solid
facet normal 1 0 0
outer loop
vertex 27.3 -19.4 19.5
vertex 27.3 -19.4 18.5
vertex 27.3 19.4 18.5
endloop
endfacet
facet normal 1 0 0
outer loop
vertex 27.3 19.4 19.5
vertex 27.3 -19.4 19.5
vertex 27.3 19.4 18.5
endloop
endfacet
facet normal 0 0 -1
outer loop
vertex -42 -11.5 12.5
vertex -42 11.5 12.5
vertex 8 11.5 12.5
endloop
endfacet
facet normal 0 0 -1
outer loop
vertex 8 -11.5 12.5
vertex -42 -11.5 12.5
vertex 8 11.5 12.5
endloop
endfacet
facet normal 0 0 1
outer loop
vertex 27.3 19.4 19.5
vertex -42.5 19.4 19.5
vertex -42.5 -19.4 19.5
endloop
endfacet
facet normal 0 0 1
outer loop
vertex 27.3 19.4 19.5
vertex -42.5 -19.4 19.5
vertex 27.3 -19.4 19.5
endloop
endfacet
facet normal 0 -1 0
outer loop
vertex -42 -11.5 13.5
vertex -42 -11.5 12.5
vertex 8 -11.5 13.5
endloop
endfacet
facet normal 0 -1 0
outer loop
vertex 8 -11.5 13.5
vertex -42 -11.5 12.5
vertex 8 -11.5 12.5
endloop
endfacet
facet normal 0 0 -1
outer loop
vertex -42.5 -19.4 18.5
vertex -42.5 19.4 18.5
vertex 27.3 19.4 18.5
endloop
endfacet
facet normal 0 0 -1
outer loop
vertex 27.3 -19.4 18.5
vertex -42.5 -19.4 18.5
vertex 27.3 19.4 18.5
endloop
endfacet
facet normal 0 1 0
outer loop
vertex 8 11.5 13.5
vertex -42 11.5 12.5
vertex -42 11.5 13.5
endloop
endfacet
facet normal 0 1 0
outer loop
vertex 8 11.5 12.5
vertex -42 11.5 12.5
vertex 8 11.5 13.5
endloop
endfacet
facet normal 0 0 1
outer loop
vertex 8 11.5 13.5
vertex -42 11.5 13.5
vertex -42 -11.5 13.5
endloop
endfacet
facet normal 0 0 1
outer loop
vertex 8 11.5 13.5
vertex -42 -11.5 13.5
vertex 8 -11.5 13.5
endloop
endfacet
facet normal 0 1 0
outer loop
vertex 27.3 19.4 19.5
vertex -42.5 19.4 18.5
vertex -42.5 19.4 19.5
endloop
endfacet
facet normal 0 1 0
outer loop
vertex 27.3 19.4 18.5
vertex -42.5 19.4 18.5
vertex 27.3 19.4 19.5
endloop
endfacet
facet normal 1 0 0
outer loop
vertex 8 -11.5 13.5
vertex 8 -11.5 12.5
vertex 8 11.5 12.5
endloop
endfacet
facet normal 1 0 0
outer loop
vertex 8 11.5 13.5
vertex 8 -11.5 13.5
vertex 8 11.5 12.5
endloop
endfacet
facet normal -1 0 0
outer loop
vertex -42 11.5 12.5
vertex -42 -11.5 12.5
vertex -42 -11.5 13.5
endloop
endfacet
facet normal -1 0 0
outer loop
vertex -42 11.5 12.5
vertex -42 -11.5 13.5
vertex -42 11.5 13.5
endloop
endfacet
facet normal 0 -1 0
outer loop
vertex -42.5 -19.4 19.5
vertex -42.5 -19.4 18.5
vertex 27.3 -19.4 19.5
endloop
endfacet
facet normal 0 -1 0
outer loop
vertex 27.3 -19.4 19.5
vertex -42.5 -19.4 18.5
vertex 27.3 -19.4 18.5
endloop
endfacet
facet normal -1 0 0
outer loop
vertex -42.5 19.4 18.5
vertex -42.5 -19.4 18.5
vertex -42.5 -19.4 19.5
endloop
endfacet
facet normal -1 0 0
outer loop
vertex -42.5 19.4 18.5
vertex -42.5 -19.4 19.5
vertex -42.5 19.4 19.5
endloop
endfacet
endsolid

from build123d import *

# Parameters (mm, degrees)
BOX122_W     = 69.8
BOX122_H     = 38.8
BOX122_DEPTH = 1
BOX084_W     = 50
BOX084_H     = 23
BOX084_DEPTH = 1


with BuildPart() as board004:
    # Box122 → Box122 (new body)
    with BuildSketch(Plane(origin=(-42.5, -19.4, 18.5), x_dir=(1, 0, 0), z_dir=(0, 0, 1))):
        with Locations((34.9, 19.4)):
            Rectangle(BOX122_W, BOX122_H)
    extrude(amount=BOX122_DEPTH)


with BuildPart() as fusion140:
    # Box084 → Box084 (new body)
    with BuildSketch(Plane(origin=(-42, -11.5, 12.5), x_dir=(1, 0, 0), z_dir=(0, 0, 1))):
        with Locations((25, 11.5)):
            Rectangle(BOX084_W, BOX084_H)
    extrude(amount=BOX084_DEPTH)

    # Fusion140: union board004
    add(board004.part)


solid = fusion140.part
